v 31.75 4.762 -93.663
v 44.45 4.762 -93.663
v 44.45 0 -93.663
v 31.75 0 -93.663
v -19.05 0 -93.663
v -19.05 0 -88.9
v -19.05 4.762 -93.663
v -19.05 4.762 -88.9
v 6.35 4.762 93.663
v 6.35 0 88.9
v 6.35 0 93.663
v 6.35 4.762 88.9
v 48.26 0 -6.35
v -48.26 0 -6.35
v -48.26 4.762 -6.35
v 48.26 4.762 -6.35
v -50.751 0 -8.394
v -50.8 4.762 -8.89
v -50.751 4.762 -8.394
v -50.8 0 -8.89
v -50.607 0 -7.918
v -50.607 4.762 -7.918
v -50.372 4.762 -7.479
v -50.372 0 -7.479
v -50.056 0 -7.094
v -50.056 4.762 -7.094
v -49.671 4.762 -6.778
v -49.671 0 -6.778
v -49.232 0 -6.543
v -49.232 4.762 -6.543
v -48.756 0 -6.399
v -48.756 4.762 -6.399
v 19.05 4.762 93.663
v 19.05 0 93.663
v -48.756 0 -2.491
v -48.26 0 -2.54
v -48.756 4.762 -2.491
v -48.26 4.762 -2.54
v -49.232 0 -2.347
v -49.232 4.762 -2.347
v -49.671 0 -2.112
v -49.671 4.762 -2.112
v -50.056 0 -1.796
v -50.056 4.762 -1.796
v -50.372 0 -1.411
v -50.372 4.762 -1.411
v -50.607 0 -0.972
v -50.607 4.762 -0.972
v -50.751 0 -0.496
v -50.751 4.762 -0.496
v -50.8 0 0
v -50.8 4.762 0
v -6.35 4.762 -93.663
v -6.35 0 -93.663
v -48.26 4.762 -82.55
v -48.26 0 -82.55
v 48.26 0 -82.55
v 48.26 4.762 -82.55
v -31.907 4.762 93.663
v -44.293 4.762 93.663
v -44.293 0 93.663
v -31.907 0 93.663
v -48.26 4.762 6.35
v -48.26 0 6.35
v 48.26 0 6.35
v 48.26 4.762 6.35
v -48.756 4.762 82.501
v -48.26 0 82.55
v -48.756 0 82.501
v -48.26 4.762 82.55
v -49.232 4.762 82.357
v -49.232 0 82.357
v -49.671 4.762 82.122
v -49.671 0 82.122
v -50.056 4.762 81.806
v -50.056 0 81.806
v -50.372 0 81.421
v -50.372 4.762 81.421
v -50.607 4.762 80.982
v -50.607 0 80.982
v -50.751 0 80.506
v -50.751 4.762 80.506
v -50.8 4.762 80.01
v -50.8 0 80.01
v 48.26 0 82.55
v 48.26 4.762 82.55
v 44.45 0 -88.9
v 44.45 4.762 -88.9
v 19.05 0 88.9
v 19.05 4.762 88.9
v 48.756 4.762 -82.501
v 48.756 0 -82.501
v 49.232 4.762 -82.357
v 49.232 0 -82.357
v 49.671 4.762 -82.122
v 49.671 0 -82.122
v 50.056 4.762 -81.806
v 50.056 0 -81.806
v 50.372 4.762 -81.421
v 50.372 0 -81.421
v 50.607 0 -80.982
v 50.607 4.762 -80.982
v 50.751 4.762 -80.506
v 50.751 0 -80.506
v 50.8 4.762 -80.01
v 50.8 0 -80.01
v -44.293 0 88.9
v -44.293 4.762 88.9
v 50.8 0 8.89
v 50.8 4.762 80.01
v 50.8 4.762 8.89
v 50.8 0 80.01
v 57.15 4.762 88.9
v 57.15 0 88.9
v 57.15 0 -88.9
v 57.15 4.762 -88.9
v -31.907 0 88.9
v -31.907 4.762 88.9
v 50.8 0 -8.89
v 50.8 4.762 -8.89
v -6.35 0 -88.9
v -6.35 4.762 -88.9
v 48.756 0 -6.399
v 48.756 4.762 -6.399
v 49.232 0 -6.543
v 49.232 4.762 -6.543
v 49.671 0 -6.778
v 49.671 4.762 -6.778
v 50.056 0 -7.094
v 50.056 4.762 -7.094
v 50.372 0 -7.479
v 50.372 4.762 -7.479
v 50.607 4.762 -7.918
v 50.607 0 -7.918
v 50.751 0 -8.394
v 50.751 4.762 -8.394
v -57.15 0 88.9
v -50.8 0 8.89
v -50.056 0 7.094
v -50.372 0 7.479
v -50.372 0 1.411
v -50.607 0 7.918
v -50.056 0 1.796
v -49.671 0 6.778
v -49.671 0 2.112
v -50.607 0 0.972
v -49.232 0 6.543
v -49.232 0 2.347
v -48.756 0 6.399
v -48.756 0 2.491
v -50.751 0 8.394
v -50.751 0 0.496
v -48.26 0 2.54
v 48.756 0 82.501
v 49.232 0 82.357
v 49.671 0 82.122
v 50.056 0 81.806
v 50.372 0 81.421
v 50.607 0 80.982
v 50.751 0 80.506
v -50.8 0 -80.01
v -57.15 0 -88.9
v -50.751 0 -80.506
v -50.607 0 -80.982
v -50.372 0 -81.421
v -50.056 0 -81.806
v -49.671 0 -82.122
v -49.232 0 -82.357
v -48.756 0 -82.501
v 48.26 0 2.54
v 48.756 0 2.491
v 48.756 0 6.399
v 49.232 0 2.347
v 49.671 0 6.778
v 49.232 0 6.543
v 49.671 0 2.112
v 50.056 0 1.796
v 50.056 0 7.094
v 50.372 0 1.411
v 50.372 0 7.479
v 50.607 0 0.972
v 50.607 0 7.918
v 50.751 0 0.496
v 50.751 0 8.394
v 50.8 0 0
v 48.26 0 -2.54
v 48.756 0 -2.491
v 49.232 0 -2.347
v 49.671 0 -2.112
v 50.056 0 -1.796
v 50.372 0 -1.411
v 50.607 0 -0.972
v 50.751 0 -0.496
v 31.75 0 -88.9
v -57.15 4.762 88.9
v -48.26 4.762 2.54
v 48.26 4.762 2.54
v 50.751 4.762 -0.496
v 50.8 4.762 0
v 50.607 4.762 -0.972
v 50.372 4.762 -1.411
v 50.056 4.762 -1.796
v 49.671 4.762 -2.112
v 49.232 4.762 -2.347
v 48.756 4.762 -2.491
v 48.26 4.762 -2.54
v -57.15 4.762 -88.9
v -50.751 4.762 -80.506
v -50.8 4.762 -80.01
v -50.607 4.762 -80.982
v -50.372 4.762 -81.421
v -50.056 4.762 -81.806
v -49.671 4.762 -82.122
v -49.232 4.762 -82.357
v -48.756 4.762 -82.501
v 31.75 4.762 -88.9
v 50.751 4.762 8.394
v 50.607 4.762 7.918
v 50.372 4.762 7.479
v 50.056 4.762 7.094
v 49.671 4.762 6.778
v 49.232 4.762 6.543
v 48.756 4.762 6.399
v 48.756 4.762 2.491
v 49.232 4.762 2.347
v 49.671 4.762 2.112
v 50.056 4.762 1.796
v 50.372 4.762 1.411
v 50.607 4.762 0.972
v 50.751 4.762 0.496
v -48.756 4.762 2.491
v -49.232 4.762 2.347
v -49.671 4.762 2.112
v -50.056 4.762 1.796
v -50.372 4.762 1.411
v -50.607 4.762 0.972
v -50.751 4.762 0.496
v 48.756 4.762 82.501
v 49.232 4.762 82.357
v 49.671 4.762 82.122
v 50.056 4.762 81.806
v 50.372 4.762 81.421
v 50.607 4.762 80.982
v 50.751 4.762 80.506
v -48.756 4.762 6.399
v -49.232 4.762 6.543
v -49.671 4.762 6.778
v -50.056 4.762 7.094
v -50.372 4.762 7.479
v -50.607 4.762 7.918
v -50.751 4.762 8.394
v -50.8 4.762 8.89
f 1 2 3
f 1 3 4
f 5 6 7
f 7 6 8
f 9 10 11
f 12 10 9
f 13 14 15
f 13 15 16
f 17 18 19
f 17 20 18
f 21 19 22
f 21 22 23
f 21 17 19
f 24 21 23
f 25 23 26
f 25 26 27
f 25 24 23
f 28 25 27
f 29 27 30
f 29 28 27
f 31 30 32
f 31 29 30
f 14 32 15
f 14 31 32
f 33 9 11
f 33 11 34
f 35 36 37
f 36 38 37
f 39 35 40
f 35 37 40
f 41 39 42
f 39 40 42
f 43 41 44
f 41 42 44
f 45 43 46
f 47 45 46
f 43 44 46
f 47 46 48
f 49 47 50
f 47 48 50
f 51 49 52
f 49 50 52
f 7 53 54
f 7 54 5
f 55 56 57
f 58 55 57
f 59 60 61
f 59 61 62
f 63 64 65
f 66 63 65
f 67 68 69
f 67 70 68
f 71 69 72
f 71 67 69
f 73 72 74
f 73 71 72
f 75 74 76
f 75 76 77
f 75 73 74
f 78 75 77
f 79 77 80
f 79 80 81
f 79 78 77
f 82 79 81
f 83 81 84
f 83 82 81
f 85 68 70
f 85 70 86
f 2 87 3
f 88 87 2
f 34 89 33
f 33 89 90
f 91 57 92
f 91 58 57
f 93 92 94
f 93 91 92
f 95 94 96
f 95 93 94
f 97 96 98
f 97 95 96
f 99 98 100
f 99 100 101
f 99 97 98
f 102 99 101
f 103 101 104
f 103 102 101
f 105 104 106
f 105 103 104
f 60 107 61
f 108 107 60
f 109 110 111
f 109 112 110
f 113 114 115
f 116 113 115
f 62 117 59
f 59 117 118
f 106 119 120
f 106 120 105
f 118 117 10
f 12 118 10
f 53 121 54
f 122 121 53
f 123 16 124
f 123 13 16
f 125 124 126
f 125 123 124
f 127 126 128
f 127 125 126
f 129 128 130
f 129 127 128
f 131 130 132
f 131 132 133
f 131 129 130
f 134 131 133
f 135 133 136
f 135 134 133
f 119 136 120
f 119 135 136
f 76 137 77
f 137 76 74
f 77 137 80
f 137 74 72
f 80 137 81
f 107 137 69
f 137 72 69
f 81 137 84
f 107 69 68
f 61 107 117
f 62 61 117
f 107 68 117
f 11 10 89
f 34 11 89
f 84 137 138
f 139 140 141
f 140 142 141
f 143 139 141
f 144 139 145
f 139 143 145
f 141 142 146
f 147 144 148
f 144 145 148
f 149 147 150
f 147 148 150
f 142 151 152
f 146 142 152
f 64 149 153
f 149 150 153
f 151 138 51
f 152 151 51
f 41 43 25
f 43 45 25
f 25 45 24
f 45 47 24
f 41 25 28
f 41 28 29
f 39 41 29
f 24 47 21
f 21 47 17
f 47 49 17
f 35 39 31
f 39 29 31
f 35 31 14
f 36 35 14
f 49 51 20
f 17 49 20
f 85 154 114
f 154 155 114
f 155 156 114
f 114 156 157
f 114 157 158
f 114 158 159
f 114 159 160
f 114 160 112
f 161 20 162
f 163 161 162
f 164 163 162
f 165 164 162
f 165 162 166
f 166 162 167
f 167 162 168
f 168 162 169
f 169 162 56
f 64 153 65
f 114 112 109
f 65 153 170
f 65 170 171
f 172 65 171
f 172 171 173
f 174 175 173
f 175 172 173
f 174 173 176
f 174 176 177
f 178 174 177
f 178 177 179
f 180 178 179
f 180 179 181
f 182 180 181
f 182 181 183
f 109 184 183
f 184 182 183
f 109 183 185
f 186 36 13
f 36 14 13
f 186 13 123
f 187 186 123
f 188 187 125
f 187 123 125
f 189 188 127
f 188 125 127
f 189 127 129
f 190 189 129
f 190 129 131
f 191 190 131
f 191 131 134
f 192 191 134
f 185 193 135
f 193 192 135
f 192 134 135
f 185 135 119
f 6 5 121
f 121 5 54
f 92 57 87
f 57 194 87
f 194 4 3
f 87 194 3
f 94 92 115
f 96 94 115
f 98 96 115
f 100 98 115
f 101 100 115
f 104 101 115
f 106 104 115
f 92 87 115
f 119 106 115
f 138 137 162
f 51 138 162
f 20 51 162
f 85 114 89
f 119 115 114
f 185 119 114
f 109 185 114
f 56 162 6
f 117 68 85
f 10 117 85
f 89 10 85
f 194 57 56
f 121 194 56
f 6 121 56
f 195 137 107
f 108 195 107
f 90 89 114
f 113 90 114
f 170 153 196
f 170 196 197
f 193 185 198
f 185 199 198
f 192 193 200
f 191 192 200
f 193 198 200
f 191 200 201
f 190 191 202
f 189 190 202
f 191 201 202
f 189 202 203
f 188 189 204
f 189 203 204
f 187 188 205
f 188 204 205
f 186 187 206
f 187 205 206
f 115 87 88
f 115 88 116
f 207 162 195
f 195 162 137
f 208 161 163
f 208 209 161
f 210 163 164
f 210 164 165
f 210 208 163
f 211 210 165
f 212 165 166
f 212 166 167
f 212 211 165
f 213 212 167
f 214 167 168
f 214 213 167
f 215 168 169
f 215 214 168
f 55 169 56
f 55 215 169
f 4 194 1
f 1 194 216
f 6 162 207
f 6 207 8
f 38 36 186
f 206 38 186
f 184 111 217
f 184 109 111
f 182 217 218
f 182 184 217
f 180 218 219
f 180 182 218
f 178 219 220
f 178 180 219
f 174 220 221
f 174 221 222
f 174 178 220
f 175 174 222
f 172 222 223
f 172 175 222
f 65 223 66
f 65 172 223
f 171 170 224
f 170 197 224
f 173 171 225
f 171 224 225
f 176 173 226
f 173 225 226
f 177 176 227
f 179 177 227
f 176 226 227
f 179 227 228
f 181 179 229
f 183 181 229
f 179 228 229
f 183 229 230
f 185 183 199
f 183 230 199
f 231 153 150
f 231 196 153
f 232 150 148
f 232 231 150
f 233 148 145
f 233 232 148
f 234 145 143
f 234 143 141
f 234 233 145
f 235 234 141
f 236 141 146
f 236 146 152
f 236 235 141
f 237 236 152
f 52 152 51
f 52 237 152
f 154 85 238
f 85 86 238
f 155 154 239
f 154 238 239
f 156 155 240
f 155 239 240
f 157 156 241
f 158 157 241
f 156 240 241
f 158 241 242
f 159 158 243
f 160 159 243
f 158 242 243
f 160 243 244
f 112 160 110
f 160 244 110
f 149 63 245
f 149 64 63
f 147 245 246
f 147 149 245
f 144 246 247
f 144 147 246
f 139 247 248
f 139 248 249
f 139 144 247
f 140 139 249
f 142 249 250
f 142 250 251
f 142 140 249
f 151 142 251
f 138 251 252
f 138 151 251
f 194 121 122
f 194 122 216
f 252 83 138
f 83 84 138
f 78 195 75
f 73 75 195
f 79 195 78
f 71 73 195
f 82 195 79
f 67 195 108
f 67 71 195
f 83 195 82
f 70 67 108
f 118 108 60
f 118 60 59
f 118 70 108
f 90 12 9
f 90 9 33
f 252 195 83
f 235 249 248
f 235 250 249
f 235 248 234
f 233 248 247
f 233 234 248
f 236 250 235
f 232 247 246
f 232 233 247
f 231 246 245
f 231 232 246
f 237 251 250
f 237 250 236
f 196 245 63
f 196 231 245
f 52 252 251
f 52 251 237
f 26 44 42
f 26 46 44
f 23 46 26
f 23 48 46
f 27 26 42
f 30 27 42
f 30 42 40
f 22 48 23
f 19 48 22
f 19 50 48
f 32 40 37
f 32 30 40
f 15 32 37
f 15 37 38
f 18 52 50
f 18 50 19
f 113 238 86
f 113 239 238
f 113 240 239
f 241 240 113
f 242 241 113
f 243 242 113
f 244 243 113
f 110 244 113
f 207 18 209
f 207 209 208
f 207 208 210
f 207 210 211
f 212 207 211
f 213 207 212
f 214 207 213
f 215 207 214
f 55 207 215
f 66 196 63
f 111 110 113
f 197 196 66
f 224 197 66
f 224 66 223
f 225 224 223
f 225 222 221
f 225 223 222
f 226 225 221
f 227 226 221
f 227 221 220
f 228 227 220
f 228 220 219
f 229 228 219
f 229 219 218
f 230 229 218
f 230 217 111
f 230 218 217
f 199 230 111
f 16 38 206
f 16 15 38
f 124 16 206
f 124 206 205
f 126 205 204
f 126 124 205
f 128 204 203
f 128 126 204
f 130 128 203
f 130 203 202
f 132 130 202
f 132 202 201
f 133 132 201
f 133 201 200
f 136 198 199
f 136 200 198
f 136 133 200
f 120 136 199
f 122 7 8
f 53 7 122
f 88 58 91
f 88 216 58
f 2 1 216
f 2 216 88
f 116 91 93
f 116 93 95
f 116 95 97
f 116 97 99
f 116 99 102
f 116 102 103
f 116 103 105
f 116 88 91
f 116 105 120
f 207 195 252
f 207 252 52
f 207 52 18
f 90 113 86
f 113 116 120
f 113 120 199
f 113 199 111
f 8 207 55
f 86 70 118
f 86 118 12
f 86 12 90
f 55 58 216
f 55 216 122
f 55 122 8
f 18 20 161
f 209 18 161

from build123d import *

# Parameters (mm, degrees)
SKETCH1_W           = 114.3
SKETCH1_H           = 177.8
SKETCH1_W_2         = 101.6
SKETCH1_H_2         = 165.1
BOSS_EXTRUDE1_DEPTH = 4.7625
SKETCH2_W           = 12.38677804
SKETCH2_H           = 4.7625
SKETCH2_W_2         = 12.7
BOSS_EXTRUDE2_DEPTH = 4.7625
SKETCH3_W           = 12.7
SKETCH3_H           = 4.7625
BOSS_EXTRUDE3_DEPTH = 4.7625
FILLET1_R           = 2.54
SKETCH5_W           = 114.3
SKETCH5_H           = 12.7
SKETCH5_W_2         = 101.6
SKETCH5_H_2         = 5.08
BOSS_EXTRUDE5_DEPTH = 4.7625
FILLET3_R           = 2.54


with BuildPart() as part:
    # Sketch1 → Boss-Extrude1 (new body)
    with BuildSketch(Plane(origin=(0, 0, 0), x_dir=(1, 0, 0), z_dir=(0, 1, 0))):
        Rectangle(SKETCH1_W, SKETCH1_H)
        Rectangle(SKETCH1_W_2, SKETCH1_H_2, mode=Mode.SUBTRACT)
    extrude(amount=BOSS_EXTRUDE1_DEPTH)

    # Sketch2 → Boss-Extrude2 (add)
    with BuildSketch(Plane.XY.offset(88.9)):
        with Locations((-38.1, 2.38125)):
            Rectangle(SKETCH2_W, SKETCH2_H)
        with Locations((12.7, 2.38125)):
            Rectangle(SKETCH2_W_2, SKETCH2_H)
    extrude(amount=BOSS_EXTRUDE2_DEPTH)

    # Sketch3 → Boss-Extrude3 (add)
    with BuildSketch(Plane(origin=(0, 0, -88.9), x_dir=(-1, 0, 0), z_dir=(0, 0, -1))):
        with Locations((-38.1, 2.38125)):
            Rectangle(SKETCH3_W, SKETCH3_H)
        with Locations((12.7, 2.38125)):
            Rectangle(SKETCH3_W, SKETCH3_H)
    extrude(amount=BOSS_EXTRUDE3_DEPTH)

    # Fillet1
    fillet1_edges = [part.edges().sort_by_distance(p)[0] for p in [
        (50.8, 2.38125, 82.55),
        (50.8, 2.38125, -82.55),
        (-50.8, 2.38125, -82.55),
        (-50.8, 2.38125, 82.55),
    ]]
    fillet(fillet1_edges, radius=FILLET1_R)

    # Sketch5 → Boss-Extrude5 (add)
    with BuildSketch(Plane.XZ):
        Rectangle(SKETCH5_W, SKETCH5_H)
        Rectangle(SKETCH5_W_2, SKETCH5_H_2, mode=Mode.SUBTRACT)
    extrude(amount=-BOSS_EXTRUDE5_DEPTH)

    # Fillet3
    fillet3_edges = [part.edges().sort_by_distance(p)[0] for p in [
        (-50.8, 2.38125, 6.35),
        (-50.8, 2.38125, -6.35),
        (50.8, 2.38125, -6.35),
        (50.8, 2.38125, 6.35),
        (50.8, 2.38125, -2.54),
        (-50.8, 2.38125, -2.54),
        (-50.8, 2.38125, 2.54),
        (50.8, 2.38125, 2.54),
    ]]
    fillet(fillet3_edges, radius=FILLET3_R - 0.0001)  # a hair under: the kernel refuses the full size


solid = part.part
